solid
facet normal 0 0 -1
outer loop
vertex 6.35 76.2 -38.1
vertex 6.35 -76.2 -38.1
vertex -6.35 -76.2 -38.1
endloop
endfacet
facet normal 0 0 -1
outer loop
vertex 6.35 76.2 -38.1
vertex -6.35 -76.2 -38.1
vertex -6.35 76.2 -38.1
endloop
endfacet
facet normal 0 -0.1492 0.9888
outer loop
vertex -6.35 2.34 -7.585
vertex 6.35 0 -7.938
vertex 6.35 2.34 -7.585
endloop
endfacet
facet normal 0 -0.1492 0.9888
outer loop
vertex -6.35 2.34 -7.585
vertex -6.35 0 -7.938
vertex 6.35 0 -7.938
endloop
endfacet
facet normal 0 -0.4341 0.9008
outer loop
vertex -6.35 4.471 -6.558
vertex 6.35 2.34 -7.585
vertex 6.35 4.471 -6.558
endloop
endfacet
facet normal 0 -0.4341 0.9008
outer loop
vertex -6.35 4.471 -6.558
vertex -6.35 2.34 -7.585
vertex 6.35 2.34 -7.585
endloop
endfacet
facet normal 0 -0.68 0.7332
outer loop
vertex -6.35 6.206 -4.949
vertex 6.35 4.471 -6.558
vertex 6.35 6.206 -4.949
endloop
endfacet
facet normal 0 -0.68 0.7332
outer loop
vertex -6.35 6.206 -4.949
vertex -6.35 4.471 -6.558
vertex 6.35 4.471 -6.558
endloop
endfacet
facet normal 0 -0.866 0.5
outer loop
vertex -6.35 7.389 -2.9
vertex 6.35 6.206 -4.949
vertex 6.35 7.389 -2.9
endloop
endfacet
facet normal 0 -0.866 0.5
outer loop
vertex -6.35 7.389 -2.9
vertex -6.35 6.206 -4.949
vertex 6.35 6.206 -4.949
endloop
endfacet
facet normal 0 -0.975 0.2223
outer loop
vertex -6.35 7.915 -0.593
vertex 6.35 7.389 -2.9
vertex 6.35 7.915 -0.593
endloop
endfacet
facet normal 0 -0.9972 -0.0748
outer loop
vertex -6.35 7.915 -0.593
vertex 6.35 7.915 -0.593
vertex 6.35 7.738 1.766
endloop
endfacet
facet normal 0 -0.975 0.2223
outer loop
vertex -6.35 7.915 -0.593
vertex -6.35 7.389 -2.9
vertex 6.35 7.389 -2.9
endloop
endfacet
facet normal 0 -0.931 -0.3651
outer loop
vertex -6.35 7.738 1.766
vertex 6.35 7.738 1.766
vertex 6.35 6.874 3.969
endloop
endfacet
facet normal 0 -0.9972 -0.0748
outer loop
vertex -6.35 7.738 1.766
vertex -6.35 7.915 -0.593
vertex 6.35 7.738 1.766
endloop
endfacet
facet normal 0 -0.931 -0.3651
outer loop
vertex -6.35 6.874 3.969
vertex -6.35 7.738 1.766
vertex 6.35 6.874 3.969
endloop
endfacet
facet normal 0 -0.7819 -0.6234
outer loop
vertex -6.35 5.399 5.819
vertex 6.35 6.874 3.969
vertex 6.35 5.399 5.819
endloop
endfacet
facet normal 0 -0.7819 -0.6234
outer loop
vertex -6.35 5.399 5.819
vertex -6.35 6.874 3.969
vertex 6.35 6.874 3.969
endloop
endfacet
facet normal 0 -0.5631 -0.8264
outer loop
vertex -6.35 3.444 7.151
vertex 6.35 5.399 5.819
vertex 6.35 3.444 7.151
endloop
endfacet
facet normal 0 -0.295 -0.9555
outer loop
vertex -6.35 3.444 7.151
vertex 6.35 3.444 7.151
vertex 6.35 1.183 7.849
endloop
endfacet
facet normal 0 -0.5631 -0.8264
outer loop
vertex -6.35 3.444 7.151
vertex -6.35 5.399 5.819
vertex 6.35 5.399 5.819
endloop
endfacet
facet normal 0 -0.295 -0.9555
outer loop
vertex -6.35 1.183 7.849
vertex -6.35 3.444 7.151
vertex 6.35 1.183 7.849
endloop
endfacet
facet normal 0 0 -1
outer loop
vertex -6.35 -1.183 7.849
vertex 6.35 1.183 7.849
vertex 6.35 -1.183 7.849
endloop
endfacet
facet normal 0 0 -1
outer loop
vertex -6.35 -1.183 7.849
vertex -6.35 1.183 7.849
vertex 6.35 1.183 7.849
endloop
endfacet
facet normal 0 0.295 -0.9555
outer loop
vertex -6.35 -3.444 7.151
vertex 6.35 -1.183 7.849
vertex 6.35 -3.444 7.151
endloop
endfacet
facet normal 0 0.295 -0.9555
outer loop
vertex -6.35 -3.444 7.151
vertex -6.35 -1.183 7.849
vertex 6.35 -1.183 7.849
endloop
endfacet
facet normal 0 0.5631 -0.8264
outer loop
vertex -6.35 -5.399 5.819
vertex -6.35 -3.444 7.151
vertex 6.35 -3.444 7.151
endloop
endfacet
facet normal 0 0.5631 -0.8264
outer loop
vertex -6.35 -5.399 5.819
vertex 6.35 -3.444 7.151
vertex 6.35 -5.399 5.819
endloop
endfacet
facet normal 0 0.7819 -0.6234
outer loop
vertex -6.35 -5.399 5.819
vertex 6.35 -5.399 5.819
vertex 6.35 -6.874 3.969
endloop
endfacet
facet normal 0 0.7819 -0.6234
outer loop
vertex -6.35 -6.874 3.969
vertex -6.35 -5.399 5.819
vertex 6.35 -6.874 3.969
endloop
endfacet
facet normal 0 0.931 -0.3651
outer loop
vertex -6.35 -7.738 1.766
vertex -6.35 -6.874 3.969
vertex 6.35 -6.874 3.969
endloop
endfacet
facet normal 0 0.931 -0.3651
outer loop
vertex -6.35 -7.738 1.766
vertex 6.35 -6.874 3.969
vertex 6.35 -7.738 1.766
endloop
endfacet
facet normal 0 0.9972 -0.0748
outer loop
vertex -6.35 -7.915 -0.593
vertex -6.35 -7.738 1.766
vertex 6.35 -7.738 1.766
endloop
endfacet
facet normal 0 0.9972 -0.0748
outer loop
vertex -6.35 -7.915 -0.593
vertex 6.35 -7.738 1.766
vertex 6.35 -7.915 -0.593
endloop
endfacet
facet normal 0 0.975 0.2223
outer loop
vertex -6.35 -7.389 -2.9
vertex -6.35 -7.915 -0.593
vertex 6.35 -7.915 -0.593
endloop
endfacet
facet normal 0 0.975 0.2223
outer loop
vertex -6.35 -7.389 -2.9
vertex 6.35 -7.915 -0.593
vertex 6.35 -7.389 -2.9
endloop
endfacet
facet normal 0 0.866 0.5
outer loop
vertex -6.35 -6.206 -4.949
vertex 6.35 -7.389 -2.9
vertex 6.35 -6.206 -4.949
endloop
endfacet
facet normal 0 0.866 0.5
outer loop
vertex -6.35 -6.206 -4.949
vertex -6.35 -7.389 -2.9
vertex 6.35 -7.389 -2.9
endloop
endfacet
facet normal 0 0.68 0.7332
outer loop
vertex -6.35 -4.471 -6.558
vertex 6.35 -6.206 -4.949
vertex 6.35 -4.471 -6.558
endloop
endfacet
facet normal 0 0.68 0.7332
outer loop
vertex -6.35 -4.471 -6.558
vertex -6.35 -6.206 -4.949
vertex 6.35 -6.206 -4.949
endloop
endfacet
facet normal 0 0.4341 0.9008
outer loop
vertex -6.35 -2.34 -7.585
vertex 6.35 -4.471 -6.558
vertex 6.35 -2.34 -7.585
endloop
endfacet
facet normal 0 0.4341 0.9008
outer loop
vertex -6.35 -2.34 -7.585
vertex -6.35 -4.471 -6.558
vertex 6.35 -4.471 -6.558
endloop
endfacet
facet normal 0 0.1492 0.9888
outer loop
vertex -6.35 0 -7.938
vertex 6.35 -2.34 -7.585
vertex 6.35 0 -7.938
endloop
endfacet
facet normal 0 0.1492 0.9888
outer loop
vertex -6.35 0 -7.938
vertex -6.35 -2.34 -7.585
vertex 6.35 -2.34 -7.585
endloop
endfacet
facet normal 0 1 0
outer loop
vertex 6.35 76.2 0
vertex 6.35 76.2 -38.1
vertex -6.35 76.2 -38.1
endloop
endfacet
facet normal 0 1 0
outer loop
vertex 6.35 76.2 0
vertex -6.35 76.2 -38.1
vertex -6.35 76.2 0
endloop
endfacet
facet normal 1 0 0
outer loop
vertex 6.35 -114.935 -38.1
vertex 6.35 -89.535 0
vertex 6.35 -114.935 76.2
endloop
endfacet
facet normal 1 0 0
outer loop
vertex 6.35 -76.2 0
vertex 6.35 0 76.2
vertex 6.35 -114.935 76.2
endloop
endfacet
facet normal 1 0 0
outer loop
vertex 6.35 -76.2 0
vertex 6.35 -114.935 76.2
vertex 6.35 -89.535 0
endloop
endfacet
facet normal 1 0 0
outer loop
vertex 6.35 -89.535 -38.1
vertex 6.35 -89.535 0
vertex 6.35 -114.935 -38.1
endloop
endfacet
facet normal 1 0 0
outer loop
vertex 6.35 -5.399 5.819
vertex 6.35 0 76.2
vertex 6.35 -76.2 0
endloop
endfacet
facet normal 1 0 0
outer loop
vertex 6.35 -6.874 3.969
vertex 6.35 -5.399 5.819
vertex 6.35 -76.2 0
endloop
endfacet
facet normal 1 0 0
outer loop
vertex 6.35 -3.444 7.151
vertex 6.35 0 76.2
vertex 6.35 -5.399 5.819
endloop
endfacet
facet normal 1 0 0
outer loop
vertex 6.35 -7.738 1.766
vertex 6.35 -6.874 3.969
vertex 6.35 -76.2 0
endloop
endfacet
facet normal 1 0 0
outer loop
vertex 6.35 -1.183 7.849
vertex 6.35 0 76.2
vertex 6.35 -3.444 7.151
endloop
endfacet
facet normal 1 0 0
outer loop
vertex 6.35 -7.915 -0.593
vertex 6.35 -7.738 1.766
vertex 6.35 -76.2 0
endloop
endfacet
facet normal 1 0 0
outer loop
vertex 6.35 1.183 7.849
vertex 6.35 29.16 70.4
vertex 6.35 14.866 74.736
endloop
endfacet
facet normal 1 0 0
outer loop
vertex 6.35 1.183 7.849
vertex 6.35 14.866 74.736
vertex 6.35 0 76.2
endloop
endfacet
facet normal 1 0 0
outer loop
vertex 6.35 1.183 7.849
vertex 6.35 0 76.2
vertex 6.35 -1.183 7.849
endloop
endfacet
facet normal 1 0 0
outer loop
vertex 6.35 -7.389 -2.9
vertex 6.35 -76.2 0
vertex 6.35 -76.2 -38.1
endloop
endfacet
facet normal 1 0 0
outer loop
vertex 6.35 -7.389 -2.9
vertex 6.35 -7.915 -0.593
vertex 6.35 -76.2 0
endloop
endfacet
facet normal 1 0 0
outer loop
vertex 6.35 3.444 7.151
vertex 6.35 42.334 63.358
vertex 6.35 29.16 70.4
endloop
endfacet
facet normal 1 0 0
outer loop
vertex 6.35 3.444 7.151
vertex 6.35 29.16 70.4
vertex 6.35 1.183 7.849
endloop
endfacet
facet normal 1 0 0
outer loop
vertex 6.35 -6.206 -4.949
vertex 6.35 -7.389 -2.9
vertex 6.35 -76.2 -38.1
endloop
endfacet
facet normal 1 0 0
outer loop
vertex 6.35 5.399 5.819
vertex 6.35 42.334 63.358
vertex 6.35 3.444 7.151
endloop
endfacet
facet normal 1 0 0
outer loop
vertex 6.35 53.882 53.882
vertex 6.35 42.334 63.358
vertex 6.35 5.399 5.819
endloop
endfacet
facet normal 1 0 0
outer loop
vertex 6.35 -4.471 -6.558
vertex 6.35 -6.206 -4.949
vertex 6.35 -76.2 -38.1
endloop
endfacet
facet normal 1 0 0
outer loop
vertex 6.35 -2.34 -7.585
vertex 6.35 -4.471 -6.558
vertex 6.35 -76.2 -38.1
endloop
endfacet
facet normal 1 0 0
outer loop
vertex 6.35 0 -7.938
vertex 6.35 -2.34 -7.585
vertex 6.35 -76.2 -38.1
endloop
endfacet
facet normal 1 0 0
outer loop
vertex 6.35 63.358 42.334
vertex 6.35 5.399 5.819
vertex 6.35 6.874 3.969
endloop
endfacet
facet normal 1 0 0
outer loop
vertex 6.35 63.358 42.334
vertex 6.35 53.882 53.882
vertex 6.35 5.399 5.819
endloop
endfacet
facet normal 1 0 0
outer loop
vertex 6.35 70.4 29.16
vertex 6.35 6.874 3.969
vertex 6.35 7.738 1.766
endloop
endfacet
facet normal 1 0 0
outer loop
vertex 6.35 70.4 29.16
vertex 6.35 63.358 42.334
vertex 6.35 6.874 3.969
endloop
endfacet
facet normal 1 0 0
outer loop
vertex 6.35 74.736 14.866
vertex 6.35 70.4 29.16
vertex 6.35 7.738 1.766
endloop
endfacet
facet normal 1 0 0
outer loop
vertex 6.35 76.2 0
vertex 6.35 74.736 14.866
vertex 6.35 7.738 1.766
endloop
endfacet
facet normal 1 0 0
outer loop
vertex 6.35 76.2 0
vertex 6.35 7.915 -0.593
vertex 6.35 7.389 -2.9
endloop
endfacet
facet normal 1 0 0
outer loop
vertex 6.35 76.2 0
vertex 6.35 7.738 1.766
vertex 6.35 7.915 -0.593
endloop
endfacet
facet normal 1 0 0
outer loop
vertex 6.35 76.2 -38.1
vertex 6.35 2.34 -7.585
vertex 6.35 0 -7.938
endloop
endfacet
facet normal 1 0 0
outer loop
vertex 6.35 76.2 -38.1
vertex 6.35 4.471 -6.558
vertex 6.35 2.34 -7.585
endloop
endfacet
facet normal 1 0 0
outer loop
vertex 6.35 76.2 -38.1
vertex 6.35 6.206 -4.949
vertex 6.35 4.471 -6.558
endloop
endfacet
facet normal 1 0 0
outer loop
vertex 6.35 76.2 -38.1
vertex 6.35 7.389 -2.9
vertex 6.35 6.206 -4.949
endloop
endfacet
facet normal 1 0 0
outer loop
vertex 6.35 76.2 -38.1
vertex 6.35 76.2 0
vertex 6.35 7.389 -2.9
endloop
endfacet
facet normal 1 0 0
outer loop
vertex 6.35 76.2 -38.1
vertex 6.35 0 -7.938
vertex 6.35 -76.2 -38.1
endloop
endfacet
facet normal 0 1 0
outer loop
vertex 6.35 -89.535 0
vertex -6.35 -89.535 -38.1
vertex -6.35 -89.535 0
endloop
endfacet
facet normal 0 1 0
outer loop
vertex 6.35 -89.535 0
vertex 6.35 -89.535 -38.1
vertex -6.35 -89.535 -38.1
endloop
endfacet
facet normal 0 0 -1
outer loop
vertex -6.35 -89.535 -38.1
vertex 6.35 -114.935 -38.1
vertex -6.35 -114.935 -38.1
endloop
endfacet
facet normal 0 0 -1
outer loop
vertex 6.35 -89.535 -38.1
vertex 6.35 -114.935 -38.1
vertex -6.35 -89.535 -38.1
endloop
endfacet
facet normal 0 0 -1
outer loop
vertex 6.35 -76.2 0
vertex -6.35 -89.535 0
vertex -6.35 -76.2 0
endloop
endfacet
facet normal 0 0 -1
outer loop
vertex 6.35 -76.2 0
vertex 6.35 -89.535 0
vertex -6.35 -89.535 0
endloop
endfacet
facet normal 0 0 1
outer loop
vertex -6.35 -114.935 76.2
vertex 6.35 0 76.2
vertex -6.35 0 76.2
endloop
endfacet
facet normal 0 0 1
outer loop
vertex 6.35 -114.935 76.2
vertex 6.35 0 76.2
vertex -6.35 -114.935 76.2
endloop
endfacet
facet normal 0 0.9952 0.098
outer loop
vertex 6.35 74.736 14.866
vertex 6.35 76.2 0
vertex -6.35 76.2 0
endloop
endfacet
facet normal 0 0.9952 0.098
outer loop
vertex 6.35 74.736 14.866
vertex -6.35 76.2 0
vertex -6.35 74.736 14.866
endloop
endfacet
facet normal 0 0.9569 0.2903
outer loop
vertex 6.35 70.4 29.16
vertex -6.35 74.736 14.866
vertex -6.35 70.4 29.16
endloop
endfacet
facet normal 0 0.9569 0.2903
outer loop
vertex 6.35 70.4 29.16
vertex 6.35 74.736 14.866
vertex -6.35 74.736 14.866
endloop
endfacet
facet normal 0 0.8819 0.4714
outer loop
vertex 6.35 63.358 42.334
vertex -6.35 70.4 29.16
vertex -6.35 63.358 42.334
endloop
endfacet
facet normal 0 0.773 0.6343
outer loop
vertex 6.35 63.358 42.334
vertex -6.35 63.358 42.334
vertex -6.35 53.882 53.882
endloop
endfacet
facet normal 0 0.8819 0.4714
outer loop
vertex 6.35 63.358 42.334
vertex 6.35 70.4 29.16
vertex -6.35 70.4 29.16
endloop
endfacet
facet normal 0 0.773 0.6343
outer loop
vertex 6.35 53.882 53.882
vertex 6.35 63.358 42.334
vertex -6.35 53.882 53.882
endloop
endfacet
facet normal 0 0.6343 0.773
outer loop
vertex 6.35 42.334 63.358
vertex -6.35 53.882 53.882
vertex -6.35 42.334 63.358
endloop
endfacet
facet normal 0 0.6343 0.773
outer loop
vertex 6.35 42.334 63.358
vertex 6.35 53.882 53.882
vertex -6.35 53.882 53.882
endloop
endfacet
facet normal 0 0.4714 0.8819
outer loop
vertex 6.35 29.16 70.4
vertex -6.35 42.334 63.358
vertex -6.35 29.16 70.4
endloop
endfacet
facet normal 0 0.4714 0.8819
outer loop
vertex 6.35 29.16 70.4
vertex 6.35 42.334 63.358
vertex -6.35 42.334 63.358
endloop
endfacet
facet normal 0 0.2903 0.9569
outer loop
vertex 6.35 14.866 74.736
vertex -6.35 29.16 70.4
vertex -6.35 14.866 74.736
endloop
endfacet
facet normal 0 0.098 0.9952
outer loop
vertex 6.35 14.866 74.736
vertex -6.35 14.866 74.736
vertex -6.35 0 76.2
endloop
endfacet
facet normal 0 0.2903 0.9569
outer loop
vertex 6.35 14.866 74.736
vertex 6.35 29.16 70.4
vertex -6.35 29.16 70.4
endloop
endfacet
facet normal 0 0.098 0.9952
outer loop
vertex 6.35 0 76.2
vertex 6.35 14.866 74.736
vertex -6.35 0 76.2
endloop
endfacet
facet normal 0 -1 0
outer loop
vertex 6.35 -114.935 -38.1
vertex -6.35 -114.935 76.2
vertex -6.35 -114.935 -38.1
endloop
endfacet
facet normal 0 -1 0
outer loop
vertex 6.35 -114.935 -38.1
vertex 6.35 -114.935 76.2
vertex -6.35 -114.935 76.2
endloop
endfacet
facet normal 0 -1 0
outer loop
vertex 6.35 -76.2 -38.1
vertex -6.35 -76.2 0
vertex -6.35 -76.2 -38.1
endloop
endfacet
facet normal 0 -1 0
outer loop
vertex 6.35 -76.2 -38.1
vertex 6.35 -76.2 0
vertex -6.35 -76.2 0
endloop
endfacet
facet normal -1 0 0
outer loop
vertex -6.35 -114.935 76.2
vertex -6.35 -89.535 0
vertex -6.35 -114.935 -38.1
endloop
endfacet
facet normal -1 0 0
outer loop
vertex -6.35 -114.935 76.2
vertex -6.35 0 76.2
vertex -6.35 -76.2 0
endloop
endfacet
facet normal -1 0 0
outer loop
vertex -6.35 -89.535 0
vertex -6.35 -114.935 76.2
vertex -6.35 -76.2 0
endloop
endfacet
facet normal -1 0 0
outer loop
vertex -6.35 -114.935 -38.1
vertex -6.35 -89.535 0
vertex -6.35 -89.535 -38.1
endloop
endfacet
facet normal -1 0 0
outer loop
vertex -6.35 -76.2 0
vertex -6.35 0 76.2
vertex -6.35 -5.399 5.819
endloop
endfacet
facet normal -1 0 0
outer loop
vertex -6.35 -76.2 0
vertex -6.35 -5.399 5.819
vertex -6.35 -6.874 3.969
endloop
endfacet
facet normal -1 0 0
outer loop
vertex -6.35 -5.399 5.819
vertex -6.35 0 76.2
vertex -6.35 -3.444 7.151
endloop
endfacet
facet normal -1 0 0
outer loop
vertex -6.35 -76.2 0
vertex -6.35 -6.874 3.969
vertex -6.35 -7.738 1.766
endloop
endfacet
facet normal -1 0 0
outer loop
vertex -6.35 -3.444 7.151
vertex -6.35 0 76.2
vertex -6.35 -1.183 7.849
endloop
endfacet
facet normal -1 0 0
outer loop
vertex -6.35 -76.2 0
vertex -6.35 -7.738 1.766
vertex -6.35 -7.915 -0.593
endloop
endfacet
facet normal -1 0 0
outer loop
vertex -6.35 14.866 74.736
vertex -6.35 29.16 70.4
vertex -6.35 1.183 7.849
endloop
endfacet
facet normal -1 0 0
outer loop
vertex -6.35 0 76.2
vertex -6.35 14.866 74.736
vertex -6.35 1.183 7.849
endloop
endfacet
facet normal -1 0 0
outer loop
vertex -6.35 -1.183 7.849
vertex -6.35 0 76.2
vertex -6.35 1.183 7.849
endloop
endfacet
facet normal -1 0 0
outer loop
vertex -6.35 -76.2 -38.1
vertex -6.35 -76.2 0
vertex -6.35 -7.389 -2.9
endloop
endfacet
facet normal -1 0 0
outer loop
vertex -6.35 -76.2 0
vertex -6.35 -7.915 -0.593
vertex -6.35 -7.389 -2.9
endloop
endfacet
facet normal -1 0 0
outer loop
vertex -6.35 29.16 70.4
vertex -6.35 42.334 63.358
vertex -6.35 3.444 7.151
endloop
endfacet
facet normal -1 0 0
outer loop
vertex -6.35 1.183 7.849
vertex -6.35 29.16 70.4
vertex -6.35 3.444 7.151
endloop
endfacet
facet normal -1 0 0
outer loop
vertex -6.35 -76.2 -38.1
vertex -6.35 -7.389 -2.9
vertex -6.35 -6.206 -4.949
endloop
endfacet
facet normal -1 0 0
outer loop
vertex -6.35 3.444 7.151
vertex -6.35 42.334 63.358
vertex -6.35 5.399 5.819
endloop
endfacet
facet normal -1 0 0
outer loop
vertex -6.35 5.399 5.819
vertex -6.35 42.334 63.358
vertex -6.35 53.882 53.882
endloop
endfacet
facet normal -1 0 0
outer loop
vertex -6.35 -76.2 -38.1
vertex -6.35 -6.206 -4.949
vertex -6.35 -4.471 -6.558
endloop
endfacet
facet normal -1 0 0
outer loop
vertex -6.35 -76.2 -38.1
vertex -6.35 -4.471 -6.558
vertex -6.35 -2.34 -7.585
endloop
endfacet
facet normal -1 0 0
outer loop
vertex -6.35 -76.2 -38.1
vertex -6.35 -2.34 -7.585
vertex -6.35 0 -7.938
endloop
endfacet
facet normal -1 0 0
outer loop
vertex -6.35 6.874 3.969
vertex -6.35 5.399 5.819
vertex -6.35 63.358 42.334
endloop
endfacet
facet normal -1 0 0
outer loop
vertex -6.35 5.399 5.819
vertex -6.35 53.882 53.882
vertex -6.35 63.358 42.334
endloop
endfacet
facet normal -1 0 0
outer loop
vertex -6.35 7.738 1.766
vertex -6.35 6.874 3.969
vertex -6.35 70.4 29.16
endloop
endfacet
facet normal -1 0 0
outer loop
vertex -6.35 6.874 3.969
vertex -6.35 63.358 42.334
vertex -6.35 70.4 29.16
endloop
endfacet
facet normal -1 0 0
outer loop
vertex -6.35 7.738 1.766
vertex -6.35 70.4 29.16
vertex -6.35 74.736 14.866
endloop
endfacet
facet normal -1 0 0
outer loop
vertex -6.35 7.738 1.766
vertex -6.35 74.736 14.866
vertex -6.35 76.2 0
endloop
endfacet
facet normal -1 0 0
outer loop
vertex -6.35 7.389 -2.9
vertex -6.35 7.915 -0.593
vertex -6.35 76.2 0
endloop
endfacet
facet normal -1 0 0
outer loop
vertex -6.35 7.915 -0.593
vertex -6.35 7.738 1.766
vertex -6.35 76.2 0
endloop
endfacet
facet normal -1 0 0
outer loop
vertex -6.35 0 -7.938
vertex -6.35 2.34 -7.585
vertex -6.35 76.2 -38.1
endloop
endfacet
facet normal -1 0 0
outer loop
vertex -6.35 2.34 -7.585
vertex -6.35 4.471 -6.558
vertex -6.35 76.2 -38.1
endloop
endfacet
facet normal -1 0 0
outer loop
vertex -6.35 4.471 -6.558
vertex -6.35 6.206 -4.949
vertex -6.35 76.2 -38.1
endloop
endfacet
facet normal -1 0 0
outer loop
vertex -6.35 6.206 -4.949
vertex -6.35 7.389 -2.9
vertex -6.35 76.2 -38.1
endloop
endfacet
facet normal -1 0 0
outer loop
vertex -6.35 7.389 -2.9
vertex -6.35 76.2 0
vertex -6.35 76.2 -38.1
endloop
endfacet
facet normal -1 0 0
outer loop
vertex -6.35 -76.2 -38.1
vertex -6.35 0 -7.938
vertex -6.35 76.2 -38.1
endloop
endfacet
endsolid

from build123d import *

# Parameters (mm, degrees)
SKETCH1_R           = 7.9375
BOSS_EXTRUDE1_DEPTH = 6.35


with BuildPart() as part:
    # Sketch1 → Boss-Extrude1 (new body, symmetric)
    with BuildSketch(Plane(origin=(0, 0, 0), x_dir=(0, 0, -1), z_dir=(1, 0, 0))):
        with BuildLine():
            Line((0, -76.2), (38.1, -76.2))
            Line((38.1, -76.2), (38.1, 76.2))
            Line((38.1, 76.2), (0, 76.2))
            ThreePointArc((0, 76.2), (-53.881536726, 53.881536726), (-76.2, 0))
            Line((-76.2, 0), (-76.2, -114.935))
            Line((-76.2, -114.935), (38.1, -114.935))
            Line((38.1, -114.935), (38.1, -89.535))
            Line((38.1, -89.535), (0, -89.535))
            Line((0, -89.535), (0, -76.2))
        make_face()
        Circle(SKETCH1_R, mode=Mode.SUBTRACT)
    extrude(amount=BOSS_EXTRUDE1_DEPTH, both=True)


solid = part.part
